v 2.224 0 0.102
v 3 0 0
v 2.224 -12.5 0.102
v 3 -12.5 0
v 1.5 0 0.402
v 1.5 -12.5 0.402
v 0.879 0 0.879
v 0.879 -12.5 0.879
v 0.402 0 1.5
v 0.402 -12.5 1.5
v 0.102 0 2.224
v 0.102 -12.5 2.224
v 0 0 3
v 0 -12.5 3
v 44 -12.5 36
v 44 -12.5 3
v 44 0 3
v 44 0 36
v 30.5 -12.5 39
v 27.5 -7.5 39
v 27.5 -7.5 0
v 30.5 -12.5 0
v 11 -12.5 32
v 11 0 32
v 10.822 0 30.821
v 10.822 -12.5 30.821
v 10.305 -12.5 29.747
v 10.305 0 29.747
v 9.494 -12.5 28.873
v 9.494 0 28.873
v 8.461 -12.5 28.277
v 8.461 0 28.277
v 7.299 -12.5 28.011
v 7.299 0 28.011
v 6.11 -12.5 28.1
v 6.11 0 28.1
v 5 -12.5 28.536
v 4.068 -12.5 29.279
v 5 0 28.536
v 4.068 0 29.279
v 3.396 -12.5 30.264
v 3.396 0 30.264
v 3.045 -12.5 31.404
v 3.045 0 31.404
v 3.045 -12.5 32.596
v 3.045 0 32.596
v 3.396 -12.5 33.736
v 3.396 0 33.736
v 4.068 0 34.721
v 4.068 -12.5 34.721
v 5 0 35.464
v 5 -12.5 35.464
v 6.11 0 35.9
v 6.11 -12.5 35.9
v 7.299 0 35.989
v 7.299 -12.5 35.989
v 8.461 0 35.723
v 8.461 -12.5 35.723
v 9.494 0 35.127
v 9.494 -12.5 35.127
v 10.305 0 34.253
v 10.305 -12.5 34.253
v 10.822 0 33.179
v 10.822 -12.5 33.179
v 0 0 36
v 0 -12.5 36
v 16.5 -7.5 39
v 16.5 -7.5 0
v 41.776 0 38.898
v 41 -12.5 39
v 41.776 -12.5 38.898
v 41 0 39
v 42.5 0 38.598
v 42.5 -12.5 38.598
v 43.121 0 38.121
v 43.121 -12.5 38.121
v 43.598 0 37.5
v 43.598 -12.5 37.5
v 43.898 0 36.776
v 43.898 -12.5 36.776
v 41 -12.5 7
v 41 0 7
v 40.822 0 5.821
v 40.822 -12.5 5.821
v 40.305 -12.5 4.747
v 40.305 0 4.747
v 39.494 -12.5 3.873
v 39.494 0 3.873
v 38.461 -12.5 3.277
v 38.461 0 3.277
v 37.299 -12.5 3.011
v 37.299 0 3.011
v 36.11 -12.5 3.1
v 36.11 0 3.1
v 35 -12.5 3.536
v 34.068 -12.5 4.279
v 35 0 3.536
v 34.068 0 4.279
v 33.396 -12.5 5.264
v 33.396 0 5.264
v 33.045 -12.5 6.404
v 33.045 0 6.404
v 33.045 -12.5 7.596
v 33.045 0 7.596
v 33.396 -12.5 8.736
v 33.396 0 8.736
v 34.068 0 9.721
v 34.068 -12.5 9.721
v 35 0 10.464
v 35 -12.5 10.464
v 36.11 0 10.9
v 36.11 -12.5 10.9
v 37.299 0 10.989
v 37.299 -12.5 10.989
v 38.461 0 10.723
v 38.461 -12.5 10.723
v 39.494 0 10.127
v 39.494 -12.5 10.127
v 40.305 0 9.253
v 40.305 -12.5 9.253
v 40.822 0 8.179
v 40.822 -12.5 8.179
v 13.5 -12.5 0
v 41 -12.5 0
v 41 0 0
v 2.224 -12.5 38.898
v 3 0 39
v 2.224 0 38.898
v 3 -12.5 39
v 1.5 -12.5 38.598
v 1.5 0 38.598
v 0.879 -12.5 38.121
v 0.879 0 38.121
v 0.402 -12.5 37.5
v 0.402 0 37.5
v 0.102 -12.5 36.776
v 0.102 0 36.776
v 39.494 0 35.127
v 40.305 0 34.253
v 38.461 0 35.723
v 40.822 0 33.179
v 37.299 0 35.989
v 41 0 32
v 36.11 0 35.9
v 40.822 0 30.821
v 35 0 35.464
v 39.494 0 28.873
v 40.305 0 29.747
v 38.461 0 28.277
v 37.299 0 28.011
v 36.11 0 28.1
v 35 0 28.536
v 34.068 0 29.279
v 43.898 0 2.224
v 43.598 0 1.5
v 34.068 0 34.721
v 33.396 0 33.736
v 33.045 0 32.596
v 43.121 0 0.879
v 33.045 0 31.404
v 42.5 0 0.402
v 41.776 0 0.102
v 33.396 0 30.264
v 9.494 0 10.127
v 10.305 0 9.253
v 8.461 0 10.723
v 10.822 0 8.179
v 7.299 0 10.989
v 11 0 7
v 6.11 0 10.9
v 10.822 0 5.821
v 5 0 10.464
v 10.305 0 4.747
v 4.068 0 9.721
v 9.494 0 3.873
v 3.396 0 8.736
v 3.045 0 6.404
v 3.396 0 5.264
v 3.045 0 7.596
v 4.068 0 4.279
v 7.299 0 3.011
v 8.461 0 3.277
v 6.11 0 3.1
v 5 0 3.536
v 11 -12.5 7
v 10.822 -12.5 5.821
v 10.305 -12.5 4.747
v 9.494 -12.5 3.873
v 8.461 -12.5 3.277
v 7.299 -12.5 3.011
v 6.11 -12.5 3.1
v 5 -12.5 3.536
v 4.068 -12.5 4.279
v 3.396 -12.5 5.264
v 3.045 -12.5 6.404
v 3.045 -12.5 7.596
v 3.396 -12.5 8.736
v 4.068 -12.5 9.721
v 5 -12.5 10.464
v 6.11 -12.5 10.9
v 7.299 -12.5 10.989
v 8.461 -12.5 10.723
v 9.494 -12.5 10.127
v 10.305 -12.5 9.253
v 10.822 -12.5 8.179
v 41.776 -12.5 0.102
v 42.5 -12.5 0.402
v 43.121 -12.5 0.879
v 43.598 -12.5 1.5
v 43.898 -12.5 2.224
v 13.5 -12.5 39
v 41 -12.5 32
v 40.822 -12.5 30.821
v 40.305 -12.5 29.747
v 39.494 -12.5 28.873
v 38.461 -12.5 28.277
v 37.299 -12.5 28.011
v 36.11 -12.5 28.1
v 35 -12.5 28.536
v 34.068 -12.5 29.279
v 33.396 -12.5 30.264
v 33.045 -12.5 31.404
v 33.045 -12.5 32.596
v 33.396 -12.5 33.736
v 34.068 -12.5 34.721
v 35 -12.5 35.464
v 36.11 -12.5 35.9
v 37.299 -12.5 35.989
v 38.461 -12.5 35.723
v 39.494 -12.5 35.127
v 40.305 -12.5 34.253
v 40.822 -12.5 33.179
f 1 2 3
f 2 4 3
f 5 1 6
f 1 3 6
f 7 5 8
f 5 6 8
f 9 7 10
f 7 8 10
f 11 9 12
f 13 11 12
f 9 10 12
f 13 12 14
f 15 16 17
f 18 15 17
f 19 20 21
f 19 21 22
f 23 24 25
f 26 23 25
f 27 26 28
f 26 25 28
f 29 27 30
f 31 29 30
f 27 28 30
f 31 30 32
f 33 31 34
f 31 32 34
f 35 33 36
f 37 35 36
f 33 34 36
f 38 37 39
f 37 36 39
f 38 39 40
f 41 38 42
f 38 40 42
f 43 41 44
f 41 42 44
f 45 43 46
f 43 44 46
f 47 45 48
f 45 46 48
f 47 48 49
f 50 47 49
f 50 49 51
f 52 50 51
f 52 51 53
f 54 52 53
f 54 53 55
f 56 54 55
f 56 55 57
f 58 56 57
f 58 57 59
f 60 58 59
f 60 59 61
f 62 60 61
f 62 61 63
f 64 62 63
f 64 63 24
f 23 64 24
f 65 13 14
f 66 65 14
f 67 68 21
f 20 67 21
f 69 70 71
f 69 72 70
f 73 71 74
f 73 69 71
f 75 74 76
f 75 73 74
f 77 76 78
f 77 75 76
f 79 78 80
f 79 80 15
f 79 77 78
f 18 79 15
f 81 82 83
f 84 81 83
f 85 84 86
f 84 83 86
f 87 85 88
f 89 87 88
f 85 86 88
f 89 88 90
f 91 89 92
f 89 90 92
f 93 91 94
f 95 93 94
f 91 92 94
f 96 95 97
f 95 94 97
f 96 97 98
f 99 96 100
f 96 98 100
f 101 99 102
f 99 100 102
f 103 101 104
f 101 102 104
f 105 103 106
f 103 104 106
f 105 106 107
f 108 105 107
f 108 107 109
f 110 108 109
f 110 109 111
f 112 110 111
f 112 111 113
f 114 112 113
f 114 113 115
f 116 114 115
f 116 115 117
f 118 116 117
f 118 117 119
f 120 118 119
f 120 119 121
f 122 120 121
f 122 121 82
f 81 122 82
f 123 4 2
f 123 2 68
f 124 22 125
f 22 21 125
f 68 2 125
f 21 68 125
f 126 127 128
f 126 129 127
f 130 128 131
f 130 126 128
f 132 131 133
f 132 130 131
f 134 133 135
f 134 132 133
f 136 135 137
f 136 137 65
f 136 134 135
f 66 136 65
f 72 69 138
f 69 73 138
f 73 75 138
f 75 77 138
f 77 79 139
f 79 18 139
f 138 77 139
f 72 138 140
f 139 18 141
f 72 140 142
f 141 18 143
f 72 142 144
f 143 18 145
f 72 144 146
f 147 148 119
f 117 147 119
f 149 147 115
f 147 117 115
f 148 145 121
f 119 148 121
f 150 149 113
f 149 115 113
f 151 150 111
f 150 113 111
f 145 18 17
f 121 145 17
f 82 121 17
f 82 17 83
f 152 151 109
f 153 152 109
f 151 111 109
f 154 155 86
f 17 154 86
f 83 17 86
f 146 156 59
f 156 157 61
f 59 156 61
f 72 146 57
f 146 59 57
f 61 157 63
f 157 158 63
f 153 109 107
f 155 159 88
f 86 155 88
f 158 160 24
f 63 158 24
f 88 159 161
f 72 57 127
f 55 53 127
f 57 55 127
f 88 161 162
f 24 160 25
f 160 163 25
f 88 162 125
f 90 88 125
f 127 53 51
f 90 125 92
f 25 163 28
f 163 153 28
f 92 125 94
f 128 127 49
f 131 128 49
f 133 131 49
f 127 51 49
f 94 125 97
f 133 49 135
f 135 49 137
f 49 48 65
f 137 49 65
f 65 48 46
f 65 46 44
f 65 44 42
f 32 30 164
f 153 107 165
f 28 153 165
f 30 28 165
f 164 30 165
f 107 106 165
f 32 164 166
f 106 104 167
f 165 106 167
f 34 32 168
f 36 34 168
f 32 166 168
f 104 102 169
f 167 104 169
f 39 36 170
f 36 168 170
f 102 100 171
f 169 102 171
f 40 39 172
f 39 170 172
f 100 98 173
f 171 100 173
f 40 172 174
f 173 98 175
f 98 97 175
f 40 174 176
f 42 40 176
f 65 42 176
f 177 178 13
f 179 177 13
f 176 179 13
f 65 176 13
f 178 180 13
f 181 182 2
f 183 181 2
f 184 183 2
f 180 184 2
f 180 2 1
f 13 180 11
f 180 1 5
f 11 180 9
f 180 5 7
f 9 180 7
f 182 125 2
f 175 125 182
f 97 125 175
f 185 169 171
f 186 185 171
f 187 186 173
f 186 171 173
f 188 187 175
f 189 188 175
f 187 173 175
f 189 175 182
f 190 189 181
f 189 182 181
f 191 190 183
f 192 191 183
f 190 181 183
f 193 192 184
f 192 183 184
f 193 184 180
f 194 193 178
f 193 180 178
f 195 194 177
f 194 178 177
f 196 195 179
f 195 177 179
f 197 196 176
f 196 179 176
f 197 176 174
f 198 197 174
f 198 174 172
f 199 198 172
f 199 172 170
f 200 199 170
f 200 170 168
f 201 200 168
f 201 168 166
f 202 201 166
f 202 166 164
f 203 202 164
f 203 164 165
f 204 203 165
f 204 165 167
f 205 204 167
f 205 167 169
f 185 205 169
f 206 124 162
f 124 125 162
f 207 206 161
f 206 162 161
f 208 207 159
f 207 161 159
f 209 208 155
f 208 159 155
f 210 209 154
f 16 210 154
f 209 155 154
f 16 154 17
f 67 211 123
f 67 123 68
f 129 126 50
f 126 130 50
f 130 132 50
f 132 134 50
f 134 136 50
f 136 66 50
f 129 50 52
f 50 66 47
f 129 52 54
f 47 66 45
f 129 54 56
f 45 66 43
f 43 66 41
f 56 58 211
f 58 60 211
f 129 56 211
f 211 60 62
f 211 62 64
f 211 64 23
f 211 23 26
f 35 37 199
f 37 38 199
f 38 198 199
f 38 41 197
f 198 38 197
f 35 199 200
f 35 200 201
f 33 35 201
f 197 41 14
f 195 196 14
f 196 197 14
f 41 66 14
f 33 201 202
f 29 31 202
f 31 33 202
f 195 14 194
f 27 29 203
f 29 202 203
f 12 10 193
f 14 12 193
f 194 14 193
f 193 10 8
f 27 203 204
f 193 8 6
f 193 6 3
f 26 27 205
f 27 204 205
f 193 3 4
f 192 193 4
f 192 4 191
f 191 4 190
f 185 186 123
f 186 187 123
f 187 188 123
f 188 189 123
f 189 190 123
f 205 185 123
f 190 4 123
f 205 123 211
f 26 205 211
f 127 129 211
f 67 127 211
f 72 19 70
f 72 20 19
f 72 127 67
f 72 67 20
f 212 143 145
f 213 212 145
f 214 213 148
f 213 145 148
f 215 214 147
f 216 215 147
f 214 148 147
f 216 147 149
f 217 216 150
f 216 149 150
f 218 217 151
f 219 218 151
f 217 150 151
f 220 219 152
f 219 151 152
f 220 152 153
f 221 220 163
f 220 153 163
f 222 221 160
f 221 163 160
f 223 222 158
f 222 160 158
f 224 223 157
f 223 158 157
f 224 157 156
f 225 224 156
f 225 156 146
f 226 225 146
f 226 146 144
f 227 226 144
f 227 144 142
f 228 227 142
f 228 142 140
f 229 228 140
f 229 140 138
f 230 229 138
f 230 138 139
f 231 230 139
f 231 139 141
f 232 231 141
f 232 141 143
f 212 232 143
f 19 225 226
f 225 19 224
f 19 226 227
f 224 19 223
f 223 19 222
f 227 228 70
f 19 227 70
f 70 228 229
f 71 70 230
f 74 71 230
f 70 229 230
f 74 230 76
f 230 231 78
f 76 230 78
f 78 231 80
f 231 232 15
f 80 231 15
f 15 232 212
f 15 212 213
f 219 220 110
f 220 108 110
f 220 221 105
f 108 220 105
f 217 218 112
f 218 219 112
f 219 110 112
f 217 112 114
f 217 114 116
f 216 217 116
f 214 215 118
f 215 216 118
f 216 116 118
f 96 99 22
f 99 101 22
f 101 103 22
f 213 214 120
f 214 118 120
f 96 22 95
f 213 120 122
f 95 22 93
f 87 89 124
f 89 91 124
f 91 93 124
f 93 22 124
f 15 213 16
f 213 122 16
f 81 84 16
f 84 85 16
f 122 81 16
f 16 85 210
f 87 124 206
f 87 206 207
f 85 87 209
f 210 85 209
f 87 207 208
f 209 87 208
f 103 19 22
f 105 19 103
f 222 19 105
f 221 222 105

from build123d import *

# Parameters (mm, degrees)
BOSS_EXTRUDE1_DEPTH = 39
SKETCH2_R           = 4
CUT_EXTRUDE1_DEPTH  = 13.5
FILLET1_R           = 3


with BuildPart() as part:
    # Sketch1 → Boss-Extrude1 (new body)
    with BuildSketch(Plane.XY):
        Polygon((13.5, -12.5), (16.5, -7.5), (27.5, -7.5), (30.5, -12.5), (44, -12.5), (44, 0), (0, 0), (0, -12.5), align=None)
    extrude(amount=BOSS_EXTRUDE1_DEPTH)

    # Sketch2 → Cut-Extrude1 (cut, through all)
    with BuildSketch(Plane(origin=(0, 0, 0), x_dir=(1, 0, 0), z_dir=(0, 1, 0))):
        with Locations((7, -7)):
            Circle(SKETCH2_R)
        with Locations((37, -7)):
            Circle(SKETCH2_R)
        with Locations((37, -32)):
            Circle(SKETCH2_R)
        with Locations((7, -32)):
            Circle(SKETCH2_R)
    extrude(amount=-CUT_EXTRUDE1_DEPTH, mode=Mode.SUBTRACT)

    # Fillet1
    fillet1_edges = [part.edges().sort_by_distance(p)[0] for p in [
        (0, -6.25, 0),
        (44, -6.25, 39),
        (0, -6.25, 39),
        (44, -6.25, 0),
    ]]
    fillet(fillet1_edges, radius=FILLET1_R)


solid = part.part
